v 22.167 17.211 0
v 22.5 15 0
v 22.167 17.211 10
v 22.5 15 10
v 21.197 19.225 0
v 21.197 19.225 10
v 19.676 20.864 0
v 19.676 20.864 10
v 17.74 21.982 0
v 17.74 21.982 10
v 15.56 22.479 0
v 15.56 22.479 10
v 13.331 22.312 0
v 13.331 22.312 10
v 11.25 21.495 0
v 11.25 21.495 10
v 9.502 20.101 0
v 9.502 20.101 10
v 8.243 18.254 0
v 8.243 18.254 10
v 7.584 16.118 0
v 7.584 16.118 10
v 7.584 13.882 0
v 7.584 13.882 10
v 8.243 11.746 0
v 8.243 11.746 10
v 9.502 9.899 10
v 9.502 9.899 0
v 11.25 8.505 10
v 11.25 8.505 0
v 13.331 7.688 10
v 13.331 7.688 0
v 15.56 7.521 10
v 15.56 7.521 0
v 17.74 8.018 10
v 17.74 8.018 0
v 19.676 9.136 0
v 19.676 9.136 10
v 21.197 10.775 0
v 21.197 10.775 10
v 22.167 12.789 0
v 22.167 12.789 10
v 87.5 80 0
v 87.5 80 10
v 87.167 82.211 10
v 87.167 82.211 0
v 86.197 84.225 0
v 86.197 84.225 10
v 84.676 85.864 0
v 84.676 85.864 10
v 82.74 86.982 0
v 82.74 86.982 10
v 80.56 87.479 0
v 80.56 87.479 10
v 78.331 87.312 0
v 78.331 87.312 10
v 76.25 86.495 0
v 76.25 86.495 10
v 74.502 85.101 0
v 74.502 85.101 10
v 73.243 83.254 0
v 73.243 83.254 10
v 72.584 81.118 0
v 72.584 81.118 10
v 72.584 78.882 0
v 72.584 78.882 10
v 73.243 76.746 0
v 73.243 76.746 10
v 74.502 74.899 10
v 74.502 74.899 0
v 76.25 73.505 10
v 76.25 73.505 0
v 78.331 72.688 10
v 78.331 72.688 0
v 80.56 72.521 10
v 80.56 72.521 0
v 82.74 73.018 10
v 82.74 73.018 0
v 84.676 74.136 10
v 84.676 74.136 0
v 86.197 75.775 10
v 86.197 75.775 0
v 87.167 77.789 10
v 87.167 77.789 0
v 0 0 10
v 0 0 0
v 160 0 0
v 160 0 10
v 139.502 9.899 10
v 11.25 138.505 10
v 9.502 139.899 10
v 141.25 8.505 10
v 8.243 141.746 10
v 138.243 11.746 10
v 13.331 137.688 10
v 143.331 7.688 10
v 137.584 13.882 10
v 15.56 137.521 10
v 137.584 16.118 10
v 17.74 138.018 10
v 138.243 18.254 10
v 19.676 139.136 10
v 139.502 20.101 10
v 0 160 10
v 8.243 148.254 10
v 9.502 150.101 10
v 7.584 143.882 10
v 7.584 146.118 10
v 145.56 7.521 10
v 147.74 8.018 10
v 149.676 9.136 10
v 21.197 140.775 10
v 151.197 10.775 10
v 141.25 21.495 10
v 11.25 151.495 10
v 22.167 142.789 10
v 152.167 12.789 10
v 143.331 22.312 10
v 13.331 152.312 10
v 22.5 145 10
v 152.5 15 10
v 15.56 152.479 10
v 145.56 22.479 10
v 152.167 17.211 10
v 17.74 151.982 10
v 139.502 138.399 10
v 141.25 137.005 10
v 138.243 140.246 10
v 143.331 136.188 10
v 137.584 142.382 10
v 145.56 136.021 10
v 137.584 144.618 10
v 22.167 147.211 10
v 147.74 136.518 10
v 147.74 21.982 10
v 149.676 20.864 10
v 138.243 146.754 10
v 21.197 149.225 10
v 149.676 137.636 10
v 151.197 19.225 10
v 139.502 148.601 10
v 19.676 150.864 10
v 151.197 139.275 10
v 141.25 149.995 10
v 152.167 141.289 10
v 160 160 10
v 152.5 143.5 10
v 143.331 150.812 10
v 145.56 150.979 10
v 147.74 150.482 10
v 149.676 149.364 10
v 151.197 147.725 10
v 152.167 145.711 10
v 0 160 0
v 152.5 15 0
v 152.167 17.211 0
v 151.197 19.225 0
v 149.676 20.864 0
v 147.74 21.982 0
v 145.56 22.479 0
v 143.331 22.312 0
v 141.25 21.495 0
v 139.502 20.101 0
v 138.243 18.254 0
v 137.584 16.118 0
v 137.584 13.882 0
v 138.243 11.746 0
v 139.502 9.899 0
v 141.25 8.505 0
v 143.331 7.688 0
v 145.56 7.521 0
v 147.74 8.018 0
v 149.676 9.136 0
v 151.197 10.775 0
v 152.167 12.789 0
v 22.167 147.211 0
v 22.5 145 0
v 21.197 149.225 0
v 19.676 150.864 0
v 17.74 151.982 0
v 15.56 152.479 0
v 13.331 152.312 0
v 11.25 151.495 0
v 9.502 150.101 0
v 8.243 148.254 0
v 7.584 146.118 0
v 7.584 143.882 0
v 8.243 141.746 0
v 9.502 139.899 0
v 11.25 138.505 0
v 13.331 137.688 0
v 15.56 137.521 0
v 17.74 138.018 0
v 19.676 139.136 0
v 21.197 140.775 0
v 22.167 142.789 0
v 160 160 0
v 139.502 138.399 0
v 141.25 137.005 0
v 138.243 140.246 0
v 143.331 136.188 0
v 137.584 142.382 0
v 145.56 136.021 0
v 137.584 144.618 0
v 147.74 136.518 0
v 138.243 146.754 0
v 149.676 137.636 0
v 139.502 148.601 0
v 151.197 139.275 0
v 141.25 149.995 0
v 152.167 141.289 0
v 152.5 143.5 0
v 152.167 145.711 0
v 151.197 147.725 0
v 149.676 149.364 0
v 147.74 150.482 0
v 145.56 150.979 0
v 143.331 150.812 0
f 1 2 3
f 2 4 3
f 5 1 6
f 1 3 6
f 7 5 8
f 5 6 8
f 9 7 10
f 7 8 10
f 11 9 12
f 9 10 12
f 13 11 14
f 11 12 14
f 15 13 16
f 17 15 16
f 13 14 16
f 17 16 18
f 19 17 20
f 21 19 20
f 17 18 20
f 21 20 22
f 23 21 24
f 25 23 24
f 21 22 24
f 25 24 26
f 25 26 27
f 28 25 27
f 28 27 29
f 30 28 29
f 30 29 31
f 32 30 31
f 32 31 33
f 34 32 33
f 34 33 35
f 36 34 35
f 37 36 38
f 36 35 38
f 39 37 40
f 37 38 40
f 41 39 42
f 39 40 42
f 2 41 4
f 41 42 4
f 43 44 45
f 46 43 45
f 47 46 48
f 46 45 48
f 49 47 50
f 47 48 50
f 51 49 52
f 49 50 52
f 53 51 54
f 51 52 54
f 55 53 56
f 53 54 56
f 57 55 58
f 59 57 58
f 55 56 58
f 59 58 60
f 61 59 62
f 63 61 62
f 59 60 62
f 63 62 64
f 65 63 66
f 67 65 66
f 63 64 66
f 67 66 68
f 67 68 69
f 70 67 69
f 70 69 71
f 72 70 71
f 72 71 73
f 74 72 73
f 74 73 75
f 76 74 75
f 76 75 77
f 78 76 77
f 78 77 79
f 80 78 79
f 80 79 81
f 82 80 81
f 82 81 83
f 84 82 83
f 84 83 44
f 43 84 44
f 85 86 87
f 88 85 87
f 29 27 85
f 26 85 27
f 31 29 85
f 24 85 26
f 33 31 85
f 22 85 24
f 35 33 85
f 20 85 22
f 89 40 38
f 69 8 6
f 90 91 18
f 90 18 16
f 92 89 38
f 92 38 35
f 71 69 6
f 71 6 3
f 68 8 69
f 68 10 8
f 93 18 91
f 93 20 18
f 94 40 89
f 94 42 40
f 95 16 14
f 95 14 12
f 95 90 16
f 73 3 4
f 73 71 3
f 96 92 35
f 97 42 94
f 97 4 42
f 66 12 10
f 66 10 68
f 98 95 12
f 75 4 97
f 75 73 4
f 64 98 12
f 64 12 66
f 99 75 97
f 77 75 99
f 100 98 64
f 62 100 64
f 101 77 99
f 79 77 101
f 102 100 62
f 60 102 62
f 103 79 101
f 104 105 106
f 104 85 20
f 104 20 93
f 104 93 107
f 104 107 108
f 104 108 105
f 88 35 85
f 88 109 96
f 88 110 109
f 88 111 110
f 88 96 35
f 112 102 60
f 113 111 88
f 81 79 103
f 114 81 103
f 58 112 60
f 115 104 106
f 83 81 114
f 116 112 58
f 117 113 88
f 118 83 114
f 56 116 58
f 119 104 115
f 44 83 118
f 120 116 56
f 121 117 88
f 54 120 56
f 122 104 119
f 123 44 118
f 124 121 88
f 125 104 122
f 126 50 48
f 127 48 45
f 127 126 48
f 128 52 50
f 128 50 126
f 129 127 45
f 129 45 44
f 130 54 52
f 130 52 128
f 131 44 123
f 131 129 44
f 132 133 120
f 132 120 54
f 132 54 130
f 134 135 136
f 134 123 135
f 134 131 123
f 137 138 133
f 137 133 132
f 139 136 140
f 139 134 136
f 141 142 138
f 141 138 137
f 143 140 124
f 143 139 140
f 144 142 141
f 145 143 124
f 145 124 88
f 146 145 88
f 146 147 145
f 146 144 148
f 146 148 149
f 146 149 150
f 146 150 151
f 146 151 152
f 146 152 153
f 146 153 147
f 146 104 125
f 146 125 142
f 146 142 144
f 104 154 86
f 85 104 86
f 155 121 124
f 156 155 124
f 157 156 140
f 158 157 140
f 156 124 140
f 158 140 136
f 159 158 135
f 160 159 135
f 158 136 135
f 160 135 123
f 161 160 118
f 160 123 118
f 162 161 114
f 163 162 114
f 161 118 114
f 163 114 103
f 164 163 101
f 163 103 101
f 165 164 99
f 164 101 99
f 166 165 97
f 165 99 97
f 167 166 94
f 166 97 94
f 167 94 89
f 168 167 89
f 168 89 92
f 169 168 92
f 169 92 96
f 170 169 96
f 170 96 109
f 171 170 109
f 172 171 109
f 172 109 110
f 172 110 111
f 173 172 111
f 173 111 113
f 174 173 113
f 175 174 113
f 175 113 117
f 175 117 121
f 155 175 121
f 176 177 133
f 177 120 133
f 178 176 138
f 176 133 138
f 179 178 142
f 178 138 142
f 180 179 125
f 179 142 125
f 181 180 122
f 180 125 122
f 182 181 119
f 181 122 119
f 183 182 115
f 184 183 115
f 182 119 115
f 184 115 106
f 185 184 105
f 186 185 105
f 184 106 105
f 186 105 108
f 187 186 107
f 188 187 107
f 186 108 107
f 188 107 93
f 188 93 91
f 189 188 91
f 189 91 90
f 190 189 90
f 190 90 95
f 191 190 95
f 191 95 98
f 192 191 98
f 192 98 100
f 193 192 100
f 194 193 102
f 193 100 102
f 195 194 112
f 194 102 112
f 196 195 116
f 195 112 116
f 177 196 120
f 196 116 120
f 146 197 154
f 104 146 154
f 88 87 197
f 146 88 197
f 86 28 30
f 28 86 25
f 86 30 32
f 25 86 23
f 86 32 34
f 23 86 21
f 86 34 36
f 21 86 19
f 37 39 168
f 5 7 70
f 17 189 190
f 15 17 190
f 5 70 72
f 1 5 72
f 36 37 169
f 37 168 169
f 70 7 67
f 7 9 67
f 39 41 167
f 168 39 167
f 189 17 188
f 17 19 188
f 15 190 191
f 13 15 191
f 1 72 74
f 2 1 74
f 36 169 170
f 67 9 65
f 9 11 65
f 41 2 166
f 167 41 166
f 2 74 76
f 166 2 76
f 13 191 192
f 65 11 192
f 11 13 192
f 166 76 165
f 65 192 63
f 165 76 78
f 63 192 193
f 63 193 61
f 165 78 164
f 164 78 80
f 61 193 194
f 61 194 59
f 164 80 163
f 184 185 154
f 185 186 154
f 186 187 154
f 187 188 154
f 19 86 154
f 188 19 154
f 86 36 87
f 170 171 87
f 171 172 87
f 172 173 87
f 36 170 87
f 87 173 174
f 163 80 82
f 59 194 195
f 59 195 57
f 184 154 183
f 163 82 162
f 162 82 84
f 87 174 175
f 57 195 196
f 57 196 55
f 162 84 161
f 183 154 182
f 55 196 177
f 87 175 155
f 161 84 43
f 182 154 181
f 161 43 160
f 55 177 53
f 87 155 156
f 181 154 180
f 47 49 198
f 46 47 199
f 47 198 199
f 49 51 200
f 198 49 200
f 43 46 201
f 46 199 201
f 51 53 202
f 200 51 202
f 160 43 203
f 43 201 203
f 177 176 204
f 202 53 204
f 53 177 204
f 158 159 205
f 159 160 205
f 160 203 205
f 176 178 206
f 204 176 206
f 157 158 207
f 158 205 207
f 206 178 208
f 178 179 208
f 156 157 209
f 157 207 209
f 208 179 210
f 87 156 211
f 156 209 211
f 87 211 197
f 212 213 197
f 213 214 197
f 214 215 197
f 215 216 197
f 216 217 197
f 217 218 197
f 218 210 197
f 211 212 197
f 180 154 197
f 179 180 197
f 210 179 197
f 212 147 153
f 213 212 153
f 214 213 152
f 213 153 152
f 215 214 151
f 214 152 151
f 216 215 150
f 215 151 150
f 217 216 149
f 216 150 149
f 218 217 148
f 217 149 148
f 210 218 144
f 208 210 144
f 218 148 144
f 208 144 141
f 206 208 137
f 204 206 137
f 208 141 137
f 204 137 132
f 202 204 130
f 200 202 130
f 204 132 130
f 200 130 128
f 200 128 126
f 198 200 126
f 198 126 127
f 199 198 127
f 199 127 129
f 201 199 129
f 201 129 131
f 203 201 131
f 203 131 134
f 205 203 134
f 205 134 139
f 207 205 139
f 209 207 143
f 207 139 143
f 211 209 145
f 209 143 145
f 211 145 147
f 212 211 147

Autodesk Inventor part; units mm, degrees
ref_plane "YZ Plane" through (0, 0, 0) normal (1, 0, 0) x (0, 1, 0)
ref_plane "XZ Plane" through (0, 0, 0) normal (0, 1, 0) x (-1, 0, 0)
ref_plane "XY Plane" through (0, 0, 0) normal (0, 0, 1) x (1, 0, 0)
sketch "Sketch1" plane through (0, 0, 0) normal (0, 0, 1) x (1, 0, 0)
  line L0 (0, 0) -> (160, 0)
  line L1 (160, 0) -> (160, 160)
  line L2 (160, 160) -> (0, 160)
  line L3 (0, 160) -> (0, 0)
  dimension "d0" = 160
  dimension "d1" = 160
extrude "Extrusion1" add sketch "Sketch1" along normal blind 10
sketch "Sketch2" plane through (0, 0, 10) normal (0, 0, 1) x (1, 0, 0)
  line L0 (0, 0) -> (160, 0) projected
  line L1 (0, 0) -> (15, 0)
  line L2 (15, 0) -> (15, 15)
  line L3 (160, 160) -> (0, 160) projected
  line L4 (0, 160) -> (15, 160)
  line L5 (15, 160) -> (15, 145)
  line L6 (160, 0) -> (160, 160) projected
  line L7 (160, 160) -> (145, 160)
  line L8 (145, 160) -> (145, 143.5)
  line L9 (160, 0) -> (160, 15)
  line L10 (160, 15) -> (145, 15)
  circle A0 centre (15, 145) radius 7.5
  circle A1 centre (145, 143.5) radius 7.5
  circle A2 centre (145, 15) radius 7.5
  circle A3 centre (15, 15) radius 7.5
  dimension "d4" = 15
  dimension "d5" = 15
  dimension "d6" = 15
  dimension "d7" = 15
  dimension "d8" = 15
  dimension "d9" = 16.5
  dimension "d10" = 15
  dimension "d11" = 15
  dimension "d12" = 15
  dimension "d13" = 15
  dimension "d14" = 15
  dimension "d15" = 15
extrude "Extrusion2" cut sketch "Sketch2" against normal blind 10
sketch "Sketch3" plane through (0, 0, 10) normal (0, 0, 1) x (1, 0, 0)
  line L0 (0, 160) -> (0, 0) projected
  line L1 (0, 0) -> (80, 0)
  line L2 (0, 0) -> (160, 0) projected
  line L3 (80, 0) -> (0, 0)
  line L4 (0, 0) -> (80, 0)
  dimension "d18" = 80
  dimension "d19" = 80
  dimension "d20" = 80
sketch "Sketch4" plane through (0, 0, 10) normal (0, 0, 1) x (1, 0, 0)
  line L0 (0, 0) -> (0, 80)
  line L1 (0, 160) -> (0, 0) projected
  line L2 (0, 80) -> (80, 80)
  circle A0 centre (80, 80) radius 7.5
  dimension "d21" = 80
  dimension "d22" = 80
  dimension "d23" = 15
extrude "Extrusion3" cut sketch "Sketch4" against normal blind 10
properties part number "106"
